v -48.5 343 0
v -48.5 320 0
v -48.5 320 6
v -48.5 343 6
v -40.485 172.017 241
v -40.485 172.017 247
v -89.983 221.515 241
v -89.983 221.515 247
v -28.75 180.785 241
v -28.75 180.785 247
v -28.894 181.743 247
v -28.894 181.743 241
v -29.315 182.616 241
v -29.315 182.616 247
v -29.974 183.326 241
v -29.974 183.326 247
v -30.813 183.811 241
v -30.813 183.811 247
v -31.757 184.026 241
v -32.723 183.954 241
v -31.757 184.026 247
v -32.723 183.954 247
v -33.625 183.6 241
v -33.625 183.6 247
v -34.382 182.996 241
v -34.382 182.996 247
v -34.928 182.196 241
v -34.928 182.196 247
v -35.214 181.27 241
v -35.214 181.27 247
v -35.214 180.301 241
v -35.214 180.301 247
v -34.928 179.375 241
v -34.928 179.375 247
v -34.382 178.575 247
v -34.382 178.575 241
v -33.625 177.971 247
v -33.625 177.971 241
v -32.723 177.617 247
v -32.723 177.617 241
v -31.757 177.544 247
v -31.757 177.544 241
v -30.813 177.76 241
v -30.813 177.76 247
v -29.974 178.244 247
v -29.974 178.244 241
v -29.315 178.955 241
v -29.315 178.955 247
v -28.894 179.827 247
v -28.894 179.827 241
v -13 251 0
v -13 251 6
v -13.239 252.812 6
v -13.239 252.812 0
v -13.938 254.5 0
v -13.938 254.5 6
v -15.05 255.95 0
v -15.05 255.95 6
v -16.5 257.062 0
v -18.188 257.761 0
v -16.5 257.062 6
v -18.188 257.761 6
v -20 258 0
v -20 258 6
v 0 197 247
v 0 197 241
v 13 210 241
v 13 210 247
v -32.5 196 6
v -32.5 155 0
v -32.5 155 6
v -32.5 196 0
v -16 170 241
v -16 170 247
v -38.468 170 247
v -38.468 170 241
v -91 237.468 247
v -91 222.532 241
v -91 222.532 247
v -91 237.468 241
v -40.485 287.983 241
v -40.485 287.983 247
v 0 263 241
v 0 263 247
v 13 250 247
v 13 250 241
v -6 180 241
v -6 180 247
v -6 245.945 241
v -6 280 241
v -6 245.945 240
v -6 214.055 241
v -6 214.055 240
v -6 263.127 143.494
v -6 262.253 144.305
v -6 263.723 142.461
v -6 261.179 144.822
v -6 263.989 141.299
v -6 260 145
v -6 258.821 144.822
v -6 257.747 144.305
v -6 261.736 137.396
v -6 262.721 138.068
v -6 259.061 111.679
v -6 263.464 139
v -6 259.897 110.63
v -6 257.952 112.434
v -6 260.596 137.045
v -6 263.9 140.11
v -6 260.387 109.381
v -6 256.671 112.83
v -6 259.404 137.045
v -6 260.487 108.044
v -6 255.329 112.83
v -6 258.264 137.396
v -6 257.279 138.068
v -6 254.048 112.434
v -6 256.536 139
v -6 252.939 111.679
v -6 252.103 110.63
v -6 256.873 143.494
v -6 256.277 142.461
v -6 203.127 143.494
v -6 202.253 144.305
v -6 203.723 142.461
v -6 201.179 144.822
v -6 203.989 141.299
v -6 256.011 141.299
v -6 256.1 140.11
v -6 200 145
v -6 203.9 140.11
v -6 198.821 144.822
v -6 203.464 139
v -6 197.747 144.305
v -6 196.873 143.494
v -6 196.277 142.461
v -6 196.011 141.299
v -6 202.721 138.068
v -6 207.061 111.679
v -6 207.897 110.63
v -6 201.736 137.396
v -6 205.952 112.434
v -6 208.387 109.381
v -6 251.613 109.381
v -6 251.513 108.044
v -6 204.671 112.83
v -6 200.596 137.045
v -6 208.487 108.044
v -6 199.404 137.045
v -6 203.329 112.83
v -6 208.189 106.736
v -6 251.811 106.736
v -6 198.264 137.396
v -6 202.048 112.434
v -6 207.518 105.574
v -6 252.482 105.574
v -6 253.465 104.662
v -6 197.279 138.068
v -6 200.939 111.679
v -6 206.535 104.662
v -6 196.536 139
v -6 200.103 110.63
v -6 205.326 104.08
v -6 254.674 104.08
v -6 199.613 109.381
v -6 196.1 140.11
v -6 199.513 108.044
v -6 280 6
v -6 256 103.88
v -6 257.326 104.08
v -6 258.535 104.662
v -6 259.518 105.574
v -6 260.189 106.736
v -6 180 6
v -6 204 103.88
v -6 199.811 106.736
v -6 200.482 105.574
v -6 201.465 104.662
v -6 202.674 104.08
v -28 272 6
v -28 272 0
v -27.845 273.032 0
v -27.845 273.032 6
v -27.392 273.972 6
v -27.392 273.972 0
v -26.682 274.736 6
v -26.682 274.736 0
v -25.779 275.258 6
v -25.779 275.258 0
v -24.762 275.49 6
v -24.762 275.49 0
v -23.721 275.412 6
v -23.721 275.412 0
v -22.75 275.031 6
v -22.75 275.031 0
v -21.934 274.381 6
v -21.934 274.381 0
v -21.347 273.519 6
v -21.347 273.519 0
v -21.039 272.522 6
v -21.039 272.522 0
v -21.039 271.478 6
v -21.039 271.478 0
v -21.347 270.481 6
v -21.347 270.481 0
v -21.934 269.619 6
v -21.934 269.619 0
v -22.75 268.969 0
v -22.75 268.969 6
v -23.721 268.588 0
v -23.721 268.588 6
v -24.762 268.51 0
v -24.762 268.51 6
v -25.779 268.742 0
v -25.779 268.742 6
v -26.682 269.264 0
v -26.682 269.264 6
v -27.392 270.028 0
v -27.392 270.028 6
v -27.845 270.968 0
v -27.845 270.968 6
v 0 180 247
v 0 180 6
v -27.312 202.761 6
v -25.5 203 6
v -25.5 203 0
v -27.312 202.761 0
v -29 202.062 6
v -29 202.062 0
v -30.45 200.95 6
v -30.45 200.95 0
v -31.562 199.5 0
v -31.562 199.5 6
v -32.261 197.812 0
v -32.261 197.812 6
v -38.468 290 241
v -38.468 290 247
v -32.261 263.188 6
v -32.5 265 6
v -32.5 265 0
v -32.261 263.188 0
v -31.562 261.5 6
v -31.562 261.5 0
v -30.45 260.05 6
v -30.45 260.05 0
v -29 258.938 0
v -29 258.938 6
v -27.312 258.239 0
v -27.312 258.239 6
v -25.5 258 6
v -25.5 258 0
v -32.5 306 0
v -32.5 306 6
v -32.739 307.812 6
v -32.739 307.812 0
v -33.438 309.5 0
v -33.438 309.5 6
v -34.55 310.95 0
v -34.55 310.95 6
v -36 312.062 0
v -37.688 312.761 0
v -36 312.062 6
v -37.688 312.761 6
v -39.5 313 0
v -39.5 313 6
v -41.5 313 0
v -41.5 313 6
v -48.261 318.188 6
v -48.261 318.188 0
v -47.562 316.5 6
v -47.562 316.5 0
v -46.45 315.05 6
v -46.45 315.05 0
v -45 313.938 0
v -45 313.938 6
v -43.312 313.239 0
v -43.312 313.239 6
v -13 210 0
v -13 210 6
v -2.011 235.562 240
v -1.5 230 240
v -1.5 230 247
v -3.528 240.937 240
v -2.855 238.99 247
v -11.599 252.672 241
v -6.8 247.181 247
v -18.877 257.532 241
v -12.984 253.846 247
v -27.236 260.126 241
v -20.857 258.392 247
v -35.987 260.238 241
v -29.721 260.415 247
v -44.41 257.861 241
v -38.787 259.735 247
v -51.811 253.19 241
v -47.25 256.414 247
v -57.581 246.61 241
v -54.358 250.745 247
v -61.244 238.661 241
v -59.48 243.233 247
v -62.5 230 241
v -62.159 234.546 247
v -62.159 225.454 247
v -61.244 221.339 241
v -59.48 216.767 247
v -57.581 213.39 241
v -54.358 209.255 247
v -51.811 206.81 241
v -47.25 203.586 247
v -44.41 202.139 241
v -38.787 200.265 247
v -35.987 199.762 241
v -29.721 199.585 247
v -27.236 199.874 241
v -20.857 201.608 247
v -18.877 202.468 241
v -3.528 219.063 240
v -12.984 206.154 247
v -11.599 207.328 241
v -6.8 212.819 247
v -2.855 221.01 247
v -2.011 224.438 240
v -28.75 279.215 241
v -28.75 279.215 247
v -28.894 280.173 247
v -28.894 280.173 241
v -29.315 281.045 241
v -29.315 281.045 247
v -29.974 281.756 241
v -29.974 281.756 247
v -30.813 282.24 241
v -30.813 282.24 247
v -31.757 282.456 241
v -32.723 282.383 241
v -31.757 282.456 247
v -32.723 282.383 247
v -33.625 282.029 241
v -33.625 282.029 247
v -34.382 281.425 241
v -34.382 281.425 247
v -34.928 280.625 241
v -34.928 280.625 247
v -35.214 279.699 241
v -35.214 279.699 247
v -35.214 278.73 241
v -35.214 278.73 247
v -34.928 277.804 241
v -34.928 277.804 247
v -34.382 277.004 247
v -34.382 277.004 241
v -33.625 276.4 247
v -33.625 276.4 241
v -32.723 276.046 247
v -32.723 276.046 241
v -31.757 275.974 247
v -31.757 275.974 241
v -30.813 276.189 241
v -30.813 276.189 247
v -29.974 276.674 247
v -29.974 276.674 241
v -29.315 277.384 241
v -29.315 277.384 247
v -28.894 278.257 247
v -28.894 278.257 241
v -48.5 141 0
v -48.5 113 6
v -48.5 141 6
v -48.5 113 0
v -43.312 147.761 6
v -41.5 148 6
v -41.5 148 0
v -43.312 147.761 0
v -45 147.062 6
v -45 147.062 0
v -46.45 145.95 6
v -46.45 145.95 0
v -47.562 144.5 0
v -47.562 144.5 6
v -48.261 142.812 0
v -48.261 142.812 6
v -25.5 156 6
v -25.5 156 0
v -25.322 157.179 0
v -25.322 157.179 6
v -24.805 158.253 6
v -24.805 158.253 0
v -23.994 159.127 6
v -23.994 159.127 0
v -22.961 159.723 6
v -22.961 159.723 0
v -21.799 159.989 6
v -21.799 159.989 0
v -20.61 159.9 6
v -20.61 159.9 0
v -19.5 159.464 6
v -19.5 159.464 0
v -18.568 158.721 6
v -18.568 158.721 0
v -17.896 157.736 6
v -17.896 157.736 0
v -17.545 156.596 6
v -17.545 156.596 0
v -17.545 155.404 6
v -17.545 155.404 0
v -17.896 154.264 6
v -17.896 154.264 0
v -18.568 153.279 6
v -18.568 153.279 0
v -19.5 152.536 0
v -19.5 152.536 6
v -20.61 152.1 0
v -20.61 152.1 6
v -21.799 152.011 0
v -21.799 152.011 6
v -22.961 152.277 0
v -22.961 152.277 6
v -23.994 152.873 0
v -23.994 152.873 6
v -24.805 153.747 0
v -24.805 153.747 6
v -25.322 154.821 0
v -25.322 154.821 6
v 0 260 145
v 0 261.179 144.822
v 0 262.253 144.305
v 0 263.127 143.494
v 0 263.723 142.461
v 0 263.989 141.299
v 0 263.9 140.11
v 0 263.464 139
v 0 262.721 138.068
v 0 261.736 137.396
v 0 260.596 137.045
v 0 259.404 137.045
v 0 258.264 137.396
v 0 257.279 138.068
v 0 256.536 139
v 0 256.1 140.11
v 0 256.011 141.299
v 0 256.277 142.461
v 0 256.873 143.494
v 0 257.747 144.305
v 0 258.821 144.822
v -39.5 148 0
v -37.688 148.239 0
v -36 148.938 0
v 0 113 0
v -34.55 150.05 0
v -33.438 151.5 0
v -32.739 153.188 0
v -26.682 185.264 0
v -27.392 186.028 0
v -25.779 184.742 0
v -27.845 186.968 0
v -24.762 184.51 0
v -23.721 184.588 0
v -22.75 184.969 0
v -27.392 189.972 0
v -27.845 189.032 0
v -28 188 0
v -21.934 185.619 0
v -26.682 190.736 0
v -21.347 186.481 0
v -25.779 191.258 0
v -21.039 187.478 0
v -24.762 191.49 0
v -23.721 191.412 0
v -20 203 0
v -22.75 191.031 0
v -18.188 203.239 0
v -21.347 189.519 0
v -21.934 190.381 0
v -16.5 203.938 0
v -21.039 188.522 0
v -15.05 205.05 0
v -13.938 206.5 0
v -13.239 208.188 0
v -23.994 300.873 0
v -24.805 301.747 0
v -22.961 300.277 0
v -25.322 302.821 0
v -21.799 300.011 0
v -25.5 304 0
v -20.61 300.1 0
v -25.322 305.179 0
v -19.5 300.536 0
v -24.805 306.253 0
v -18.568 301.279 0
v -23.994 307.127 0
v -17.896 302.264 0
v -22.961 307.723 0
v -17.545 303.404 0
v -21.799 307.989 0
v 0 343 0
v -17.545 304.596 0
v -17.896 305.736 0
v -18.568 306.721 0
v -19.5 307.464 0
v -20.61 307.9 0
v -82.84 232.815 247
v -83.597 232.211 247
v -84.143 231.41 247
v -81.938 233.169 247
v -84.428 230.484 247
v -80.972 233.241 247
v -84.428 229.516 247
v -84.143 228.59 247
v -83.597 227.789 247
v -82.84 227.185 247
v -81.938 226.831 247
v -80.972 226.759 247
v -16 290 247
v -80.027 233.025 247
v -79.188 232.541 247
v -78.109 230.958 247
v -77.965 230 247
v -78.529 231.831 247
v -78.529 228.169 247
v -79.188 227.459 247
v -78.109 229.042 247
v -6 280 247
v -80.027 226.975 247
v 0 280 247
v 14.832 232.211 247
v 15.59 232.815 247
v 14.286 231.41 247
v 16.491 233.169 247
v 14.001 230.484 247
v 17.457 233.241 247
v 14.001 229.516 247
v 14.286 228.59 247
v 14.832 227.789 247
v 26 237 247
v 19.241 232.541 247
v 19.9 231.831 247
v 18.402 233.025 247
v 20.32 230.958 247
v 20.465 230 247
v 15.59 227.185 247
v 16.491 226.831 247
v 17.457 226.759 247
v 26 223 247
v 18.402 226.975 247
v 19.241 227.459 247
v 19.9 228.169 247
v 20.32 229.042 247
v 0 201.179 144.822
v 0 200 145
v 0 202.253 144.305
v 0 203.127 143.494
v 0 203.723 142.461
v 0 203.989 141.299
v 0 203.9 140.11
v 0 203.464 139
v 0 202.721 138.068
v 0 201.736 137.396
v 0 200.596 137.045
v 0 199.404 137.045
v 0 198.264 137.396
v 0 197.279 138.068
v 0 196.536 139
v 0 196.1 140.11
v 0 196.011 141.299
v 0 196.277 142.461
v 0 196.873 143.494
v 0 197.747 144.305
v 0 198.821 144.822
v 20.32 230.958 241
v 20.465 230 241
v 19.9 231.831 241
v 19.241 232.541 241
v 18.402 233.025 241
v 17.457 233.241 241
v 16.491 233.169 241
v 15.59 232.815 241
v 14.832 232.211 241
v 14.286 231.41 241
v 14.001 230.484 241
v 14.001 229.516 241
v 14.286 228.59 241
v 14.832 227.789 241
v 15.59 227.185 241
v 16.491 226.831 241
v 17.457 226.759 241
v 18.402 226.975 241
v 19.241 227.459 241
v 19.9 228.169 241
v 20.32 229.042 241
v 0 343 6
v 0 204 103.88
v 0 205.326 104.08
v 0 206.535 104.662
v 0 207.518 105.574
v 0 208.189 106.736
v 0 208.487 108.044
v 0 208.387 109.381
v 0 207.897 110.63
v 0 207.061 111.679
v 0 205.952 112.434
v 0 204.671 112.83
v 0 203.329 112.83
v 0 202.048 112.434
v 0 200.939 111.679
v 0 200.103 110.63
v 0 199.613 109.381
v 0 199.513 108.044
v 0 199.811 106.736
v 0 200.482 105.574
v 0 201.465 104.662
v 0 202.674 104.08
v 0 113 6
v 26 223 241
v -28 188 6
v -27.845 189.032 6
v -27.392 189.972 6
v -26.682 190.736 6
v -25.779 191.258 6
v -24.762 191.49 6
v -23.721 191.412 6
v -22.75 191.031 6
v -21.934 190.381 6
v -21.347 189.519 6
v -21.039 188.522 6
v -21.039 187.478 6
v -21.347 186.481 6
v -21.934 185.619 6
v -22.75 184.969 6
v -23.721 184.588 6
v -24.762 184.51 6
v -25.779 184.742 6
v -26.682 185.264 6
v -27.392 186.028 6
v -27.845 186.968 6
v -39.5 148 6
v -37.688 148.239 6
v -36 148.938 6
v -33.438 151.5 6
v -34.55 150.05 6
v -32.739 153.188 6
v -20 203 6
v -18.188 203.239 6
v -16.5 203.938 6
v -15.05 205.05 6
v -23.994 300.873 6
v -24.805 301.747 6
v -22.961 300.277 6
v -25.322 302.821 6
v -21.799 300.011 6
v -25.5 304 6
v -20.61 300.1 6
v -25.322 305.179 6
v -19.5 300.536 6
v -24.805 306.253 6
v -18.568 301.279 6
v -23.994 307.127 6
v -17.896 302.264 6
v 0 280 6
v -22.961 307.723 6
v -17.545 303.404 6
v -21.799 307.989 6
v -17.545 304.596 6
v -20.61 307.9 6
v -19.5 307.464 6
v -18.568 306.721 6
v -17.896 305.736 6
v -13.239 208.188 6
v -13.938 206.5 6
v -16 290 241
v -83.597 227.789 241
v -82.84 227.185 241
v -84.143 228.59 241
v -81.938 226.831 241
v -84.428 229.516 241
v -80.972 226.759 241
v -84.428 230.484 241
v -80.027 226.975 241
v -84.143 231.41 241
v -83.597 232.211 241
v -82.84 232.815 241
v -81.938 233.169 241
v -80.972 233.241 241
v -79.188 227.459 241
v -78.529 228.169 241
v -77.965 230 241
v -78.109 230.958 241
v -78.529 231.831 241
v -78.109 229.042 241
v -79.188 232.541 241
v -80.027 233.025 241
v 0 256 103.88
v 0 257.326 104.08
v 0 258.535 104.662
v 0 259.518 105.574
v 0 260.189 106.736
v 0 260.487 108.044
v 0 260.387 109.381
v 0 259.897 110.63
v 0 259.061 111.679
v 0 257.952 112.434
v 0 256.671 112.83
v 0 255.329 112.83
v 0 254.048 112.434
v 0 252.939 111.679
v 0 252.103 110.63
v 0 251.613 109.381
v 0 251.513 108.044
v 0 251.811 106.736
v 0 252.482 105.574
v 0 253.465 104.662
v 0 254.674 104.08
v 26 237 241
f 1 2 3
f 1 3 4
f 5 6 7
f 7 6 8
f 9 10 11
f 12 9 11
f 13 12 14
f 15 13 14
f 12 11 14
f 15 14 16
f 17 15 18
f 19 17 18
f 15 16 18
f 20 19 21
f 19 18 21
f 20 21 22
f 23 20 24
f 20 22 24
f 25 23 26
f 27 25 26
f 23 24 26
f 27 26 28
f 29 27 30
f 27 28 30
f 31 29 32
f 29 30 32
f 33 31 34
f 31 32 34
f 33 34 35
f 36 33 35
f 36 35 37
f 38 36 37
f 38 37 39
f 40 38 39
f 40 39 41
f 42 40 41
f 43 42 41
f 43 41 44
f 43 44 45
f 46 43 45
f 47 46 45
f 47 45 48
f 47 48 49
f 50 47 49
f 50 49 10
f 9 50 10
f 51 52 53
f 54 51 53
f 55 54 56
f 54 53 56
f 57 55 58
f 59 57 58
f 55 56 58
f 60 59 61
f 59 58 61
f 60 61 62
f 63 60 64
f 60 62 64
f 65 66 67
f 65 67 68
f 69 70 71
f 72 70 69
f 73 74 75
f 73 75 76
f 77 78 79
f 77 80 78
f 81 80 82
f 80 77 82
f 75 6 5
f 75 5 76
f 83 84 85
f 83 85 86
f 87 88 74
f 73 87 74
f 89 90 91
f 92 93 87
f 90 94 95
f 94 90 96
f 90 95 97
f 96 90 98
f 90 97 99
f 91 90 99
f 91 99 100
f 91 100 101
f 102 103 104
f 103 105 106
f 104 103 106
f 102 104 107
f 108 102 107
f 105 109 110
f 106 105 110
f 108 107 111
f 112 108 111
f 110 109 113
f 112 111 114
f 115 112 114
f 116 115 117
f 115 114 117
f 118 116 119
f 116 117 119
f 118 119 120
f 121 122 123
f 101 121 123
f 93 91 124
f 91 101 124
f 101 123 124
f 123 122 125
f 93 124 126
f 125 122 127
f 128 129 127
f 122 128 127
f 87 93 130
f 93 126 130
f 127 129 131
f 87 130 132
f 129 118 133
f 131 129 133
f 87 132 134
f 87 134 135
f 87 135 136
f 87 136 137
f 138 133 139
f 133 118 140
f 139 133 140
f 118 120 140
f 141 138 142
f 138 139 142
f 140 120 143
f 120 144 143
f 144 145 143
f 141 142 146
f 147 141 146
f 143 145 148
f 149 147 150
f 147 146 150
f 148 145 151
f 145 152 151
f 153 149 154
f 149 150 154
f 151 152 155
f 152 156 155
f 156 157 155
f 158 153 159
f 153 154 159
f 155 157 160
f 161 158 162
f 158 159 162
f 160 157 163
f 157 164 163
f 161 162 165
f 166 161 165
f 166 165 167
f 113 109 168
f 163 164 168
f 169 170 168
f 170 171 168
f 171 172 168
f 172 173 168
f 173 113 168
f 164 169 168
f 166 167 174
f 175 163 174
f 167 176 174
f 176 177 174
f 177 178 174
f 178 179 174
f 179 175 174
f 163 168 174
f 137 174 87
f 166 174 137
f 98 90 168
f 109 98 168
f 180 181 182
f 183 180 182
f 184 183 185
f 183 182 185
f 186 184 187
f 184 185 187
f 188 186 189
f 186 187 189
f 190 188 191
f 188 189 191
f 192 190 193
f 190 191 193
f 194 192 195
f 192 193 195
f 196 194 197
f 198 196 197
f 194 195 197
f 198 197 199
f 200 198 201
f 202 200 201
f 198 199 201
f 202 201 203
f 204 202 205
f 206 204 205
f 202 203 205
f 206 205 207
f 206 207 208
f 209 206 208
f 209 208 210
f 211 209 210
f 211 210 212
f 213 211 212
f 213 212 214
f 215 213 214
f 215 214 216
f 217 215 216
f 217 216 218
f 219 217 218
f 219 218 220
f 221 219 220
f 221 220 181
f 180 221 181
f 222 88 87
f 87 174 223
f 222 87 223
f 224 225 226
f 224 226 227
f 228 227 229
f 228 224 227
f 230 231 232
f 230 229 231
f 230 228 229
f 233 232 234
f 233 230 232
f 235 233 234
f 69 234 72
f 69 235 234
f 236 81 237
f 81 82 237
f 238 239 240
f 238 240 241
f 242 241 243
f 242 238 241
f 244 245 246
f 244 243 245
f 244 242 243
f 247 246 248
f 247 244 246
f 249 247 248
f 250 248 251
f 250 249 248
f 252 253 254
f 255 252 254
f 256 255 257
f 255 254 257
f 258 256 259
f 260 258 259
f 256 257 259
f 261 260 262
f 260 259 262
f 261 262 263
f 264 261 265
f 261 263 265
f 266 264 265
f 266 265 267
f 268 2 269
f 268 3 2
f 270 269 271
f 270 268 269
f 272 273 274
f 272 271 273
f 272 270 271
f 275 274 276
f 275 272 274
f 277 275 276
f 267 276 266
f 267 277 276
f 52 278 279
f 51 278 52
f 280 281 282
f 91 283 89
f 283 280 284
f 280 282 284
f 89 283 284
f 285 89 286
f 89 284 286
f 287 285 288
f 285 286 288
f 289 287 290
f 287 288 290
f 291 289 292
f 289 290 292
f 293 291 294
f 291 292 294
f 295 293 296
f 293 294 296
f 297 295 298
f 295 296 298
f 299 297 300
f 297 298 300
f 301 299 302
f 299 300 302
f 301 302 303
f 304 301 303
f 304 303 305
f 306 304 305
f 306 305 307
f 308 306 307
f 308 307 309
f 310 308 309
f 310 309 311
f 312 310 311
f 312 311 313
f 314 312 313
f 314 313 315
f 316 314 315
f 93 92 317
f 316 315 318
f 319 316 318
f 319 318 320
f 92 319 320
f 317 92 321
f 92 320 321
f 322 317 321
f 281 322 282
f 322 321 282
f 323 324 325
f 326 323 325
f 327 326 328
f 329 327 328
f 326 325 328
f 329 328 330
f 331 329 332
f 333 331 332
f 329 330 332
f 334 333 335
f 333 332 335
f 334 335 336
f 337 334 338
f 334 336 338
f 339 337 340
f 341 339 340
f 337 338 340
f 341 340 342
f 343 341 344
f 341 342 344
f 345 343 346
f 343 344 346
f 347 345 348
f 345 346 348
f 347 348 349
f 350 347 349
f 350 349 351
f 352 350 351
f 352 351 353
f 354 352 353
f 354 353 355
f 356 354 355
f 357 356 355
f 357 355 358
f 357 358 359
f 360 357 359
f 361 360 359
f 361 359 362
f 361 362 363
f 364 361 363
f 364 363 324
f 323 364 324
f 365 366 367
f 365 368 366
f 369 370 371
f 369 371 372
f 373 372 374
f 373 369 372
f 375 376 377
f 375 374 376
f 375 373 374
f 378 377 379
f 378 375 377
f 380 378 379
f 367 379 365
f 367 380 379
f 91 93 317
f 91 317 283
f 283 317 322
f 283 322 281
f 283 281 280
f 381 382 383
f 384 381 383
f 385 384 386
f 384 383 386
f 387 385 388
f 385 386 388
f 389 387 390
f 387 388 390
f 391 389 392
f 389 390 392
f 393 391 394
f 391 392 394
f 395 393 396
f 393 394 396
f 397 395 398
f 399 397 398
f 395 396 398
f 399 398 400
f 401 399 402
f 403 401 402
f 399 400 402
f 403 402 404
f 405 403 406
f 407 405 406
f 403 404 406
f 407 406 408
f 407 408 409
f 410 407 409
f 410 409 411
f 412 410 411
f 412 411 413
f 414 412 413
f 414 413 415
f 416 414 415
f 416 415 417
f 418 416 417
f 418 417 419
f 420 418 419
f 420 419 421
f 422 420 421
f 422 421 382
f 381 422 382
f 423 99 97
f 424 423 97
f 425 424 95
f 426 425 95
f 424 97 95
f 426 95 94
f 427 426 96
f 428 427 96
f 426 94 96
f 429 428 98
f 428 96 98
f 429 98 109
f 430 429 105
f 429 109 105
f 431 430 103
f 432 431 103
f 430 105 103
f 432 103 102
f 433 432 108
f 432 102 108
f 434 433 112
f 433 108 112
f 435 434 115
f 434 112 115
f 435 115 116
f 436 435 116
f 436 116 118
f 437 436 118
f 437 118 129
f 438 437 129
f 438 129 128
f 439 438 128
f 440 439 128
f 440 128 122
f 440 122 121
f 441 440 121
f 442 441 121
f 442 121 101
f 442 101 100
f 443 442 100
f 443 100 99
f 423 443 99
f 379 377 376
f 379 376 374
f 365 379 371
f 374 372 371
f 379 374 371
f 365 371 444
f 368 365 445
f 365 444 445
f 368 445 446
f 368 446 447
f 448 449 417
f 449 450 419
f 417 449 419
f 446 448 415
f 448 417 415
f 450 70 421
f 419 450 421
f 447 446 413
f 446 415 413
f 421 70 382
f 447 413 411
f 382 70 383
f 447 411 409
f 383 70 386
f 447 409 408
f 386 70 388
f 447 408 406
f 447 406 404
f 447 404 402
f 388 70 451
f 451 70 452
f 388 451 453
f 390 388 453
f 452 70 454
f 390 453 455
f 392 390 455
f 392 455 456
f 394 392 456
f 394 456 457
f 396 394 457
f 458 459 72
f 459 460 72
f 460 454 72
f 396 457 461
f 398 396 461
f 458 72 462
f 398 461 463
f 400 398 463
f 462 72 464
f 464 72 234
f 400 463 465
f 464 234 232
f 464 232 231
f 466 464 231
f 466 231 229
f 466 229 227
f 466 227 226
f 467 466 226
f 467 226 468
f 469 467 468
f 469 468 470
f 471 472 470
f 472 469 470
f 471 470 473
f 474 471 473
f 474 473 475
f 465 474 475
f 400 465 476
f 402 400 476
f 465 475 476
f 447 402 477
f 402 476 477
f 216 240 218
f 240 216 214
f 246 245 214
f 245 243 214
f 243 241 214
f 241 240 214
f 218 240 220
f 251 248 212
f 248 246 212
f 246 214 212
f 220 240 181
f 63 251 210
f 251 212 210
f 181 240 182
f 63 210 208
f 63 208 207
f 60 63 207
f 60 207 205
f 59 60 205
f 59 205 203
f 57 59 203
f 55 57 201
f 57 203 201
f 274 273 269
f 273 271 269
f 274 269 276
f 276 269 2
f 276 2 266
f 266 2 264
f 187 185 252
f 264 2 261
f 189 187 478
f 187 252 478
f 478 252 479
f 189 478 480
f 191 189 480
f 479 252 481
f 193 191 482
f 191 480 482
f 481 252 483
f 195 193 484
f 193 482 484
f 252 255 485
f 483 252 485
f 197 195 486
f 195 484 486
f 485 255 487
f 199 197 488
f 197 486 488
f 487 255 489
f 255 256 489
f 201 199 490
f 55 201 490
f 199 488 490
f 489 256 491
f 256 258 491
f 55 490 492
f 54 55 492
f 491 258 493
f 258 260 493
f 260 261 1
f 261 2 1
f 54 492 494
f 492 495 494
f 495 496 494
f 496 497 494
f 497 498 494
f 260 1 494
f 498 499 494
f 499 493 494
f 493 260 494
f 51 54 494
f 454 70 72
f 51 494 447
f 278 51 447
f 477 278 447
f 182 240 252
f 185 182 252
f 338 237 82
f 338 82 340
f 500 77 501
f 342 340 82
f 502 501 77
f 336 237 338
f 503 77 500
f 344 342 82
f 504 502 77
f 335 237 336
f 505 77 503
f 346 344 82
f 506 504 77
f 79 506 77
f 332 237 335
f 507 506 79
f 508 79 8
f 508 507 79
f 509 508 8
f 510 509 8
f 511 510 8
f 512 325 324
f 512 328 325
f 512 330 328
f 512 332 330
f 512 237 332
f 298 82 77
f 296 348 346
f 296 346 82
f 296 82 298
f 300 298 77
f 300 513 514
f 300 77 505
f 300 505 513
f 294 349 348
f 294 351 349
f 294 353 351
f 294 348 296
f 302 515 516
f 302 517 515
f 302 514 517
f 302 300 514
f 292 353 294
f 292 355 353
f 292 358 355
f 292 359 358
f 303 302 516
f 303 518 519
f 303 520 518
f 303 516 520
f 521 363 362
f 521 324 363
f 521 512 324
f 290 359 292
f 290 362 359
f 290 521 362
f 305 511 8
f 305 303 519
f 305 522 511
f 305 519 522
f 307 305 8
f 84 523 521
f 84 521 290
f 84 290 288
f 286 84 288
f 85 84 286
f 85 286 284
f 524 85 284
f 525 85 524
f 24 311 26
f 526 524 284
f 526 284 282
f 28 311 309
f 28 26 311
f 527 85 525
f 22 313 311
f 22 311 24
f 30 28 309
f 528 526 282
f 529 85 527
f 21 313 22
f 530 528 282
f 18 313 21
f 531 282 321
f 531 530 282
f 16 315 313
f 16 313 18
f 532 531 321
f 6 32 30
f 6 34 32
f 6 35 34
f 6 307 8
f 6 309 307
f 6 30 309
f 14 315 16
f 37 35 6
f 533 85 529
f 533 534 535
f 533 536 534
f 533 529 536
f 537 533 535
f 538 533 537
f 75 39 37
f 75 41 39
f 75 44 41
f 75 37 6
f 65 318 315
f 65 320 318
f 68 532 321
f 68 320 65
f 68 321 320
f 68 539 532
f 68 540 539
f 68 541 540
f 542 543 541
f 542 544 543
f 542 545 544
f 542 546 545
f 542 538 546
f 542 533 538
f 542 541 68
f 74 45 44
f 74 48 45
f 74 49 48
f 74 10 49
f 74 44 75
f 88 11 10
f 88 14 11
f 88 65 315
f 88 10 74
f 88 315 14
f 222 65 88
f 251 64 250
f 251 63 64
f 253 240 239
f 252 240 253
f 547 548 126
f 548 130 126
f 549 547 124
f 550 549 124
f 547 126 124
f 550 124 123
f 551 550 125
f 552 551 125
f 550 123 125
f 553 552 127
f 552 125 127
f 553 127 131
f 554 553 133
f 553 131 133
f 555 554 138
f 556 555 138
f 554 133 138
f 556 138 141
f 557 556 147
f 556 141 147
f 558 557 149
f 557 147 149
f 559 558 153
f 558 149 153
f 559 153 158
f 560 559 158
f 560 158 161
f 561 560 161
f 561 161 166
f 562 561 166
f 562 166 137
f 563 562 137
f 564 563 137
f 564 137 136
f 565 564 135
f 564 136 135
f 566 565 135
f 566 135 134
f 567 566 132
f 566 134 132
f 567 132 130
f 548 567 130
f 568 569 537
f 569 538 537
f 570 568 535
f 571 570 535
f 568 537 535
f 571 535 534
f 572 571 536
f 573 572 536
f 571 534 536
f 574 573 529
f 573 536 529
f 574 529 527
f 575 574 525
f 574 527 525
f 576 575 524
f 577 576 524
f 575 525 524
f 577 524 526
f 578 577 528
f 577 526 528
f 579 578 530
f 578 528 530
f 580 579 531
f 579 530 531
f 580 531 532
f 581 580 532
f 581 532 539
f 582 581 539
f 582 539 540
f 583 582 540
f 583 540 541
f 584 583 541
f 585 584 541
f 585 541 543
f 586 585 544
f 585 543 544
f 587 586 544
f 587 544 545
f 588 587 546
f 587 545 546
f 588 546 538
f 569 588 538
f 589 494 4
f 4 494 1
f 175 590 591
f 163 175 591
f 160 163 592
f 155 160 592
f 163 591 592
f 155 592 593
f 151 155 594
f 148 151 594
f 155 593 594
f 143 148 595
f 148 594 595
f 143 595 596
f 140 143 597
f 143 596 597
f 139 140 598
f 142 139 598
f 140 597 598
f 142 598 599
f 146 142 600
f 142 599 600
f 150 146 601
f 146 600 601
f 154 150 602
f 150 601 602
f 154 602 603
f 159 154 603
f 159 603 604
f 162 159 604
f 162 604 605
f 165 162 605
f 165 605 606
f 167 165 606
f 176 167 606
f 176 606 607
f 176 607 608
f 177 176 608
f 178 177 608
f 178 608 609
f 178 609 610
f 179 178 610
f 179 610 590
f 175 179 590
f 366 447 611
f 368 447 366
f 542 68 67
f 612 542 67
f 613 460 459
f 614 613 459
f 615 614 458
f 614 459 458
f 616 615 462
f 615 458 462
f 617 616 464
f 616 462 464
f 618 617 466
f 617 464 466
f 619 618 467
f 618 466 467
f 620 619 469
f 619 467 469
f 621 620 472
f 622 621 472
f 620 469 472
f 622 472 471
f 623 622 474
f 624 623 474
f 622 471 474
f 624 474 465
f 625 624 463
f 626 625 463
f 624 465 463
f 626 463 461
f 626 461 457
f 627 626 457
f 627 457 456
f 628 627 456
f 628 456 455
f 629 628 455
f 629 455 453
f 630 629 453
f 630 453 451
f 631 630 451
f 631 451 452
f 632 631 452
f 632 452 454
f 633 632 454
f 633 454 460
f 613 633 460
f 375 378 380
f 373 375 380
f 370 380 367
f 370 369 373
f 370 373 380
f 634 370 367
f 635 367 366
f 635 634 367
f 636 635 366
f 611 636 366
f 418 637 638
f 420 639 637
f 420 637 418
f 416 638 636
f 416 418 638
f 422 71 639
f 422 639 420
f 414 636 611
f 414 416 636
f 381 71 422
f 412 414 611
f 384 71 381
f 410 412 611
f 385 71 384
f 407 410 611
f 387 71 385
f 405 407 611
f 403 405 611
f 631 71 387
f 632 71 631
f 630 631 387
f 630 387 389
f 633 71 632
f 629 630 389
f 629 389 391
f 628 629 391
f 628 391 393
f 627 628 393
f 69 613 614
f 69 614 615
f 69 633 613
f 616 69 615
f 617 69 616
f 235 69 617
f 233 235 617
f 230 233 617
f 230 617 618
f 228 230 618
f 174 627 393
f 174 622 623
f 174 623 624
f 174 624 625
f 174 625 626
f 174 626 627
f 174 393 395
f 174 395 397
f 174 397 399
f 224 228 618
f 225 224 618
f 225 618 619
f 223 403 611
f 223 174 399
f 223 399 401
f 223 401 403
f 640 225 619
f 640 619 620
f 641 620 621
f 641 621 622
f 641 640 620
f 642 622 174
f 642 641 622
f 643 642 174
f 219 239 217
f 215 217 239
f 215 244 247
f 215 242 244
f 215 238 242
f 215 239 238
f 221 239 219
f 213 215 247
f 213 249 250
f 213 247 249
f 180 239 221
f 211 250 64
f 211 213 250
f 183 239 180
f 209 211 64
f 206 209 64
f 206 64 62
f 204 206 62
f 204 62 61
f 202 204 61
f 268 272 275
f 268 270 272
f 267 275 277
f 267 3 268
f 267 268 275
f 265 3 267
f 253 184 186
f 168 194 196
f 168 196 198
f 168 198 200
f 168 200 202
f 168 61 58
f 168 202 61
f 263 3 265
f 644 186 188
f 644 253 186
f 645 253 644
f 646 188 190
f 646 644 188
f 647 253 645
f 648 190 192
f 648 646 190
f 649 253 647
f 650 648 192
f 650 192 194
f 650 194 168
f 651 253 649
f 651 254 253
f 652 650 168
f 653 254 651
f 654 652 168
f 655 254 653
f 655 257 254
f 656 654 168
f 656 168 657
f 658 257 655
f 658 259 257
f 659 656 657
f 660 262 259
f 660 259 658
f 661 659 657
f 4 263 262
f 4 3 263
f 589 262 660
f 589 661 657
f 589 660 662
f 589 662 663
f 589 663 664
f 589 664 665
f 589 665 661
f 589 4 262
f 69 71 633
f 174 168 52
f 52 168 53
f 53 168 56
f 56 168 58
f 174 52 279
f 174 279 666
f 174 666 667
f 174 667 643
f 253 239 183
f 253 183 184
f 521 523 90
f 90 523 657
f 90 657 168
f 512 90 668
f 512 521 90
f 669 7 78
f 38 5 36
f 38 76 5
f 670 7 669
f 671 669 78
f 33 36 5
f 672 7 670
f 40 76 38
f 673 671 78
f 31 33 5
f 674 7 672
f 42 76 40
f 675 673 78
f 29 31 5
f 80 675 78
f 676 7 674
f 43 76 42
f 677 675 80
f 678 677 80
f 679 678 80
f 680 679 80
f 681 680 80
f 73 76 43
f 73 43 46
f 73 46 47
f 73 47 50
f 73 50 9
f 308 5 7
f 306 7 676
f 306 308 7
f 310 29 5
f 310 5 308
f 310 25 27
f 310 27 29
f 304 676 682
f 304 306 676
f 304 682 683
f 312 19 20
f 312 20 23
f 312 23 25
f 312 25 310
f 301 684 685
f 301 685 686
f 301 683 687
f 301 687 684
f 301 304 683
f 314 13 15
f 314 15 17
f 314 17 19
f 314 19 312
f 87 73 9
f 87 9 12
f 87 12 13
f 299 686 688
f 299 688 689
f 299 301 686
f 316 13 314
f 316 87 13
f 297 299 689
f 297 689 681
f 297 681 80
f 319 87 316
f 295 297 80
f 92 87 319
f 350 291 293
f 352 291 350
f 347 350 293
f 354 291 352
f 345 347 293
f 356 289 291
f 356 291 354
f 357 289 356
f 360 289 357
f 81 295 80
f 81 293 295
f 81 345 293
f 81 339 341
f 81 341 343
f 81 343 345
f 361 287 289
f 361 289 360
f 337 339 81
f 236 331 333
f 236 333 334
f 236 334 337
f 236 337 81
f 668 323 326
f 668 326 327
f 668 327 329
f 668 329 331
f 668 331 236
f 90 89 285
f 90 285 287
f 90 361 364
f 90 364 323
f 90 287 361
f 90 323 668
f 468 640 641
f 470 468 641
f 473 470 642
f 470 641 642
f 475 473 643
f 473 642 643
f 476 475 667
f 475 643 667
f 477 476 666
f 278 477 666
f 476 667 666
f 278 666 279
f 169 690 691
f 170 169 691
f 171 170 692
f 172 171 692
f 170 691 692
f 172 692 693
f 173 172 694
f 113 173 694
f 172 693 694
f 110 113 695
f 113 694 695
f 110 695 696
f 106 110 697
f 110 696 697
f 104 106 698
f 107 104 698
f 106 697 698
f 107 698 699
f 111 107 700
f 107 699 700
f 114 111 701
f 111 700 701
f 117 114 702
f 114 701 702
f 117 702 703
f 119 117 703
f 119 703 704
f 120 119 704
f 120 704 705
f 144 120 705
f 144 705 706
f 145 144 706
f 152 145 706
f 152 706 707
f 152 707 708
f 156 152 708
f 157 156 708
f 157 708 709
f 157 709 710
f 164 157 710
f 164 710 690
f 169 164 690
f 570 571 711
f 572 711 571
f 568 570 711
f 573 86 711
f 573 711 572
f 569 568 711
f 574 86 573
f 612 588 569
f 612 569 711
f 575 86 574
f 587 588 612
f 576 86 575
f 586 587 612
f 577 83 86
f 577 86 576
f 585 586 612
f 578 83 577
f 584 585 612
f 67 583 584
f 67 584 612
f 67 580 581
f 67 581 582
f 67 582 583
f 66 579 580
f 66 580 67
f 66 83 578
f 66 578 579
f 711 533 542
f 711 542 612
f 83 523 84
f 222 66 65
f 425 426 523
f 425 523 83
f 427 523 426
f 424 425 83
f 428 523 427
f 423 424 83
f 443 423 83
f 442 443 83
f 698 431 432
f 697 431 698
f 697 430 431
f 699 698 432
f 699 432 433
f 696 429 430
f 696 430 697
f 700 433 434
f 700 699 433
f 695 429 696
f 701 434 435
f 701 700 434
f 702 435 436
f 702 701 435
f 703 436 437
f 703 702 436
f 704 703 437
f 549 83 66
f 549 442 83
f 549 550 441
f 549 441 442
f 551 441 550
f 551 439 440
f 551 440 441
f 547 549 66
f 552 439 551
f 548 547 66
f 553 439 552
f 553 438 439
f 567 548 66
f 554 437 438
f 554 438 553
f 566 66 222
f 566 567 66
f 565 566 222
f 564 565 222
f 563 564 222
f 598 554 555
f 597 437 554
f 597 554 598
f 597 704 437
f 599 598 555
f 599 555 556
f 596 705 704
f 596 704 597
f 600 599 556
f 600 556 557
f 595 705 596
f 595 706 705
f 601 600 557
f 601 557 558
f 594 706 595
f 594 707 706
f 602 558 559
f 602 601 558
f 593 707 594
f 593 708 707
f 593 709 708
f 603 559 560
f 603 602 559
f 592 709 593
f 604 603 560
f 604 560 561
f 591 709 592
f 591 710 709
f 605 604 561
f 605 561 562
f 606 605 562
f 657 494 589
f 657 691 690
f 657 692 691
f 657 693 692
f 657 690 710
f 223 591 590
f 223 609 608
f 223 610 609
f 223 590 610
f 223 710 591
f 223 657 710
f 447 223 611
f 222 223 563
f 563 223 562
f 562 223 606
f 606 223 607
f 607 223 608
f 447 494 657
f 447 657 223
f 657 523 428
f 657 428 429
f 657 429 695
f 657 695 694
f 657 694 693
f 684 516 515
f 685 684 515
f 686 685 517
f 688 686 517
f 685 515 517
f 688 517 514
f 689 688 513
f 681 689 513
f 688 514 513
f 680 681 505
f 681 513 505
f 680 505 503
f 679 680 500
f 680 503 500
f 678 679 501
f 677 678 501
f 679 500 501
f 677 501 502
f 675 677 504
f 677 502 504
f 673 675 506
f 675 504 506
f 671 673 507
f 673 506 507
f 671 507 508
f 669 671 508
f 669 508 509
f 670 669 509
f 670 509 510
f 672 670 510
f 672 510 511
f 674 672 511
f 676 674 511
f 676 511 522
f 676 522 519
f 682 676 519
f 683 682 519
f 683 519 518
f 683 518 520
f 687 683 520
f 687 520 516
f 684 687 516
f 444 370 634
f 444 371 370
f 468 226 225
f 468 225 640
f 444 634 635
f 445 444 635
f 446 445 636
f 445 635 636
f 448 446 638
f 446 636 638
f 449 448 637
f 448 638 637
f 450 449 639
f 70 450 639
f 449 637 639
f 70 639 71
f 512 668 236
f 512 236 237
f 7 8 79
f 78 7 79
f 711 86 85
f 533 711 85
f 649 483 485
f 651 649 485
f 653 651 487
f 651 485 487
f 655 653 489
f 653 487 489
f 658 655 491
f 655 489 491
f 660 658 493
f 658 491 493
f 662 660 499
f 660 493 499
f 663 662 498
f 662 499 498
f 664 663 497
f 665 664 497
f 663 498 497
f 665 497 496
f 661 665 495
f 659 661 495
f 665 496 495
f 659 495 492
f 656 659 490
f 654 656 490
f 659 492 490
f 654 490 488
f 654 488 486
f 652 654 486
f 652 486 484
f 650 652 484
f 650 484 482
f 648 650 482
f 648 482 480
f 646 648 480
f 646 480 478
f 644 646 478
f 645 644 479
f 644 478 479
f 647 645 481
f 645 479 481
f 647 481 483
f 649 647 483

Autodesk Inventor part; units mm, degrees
ref_plane "YZ Plane" through (0, 0, 0) normal (1, 0, 0) x (0, 1, 0)
sketch "Sketch1" plane through (0, 0, 0) normal (0, 0, 1) x (1, 0, 0)
  line L0 (0, 343) -> (-48.5, 343) projected
  line L1 (0, 343) -> (0, 113)
  line L2 (0, 113) -> (-48.5, 113)
  line L3 (-48.5, 113) -> (-48.5, 148)
  line L4 (-48.5, 148) -> (-32.5, 148)
  line L5 (-32.5, 148) -> (-32.5, 203)
  line L6 (-32.5, 203) -> (-13, 203)
  line L7 (-13, 203) -> (-13, 258)
  line L8 (-13, 258) -> (-32.5, 258)
  line L9 (-32.5, 258) -> (-32.5, 313)
  line L10 (-32.5, 313) -> (-48.5, 313)
  line L11 (-48.5, 313) -> (-48.5, 343)
  point P0 (0, 0)
  dimension "d0" = 230
  dimension "d1" = 13
  dimension "d2" = 30
  dimension "d3" = 55
  dimension "d4" = 55
  dimension "d5" = 55
  dimension "d6" = 16
extrude "Extrusion1" add sketch "Sketch1" along normal blind 6
fillet "Fillet1" radius 7 8 edges at (-32.5, 148, 3) (-32.5, 203, 3) (-13, 203, 3) (-13, 258, 3) (-32.5, 258, 3) (-32.5, 313, 3) (-48.5, 313, 3) (-48.5, 148, 3)
sketch "Sketch2" plane through (0, 0, 6) normal (0, 0, 1) x (1, 0, 0)
  line L0 (0, 113) -> (0, 343) projected
  line L1 (-6, 180) -> (0, 180)
  line L2 (0, 180) -> (0, 280)
  line L3 (0, 280) -> (-6, 280)
  line L4 (-6, 280) -> (-6, 180)
  line L5 (-15.5, 205) -> (-48.5, 205) construction
  line L6 (-48.5, 255) -> (-15.5, 255) construction
  line L7 (-15.5, 255) -> (-15.5, 205) construction
  line L8 (-15.5, 230) -> (0, 230) construction
  point P0 (0, 0)
  dimension "d10" = 100
  dimension "d11" = 6
extrude "Extrusion2" add sketch "Sketch2" along normal blind 241
sketch "Sketch3" plane through (-6, 180, 6) normal (-1, 0, 0) x (0, 0, 1)
  line L0 (241, 0) -> (241, 100) projected
  line L1 (235, 0) -> (235, 100)
  line L2 (241, 100) -> (241, 0)
  line L3 (241, 100) -> (241, 0) projected
  line L4 (241, 0) -> (241, -10)
  line L5 (241, -10) -> (235, -10)
  line L6 (235, -10) -> (235, 0)
  line L7 (235, 100) -> (235, 110)
  line L8 (235, 110) -> (241, 110)
  line L9 (0, 100) -> (241, 100) construction
  line L10 (241, 110) -> (241, 100)
  point P0 (-6, -180)
  dimension "d14" = 6
  dimension "d17" = 10
  dimension "d18" = 10
extrude "Extrusion3" add sketch "Sketch3" along normal blind 85
sketch "Sketch4" plane through (0, 0, 247) normal (0, 0, 1) x (1, 0, 0)
  line L0 (-37.6569, 174.8457) -> (-87.1543, 224.3431) construction
  line L1 (-87.1543, 235.6569) -> (-37.6569, 285.1543) construction
  line L2 (-40.4853, 172.0172) -> (-89.9828, 221.5147)
  line L3 (-91, 237.468) -> (-40.4853, 287.9828)
  line L4 (-89.9828, 221.5147) -> (-91, 222.532)
  line L5 (-91, 170) -> (-91, 290) projected
  line L6 (-89.9828, 238.4853) -> (-91, 237.468)
  line L7 (-40.4853, 287.9828) -> (-38.468, 290)
  line L8 (-6, 290) -> (-91, 290) projected
  line L9 (-40.4853, 172.0172) -> (-38.468, 170)
  line L10 (-6, 170) -> (-91, 170) projected
  line L11 (-38.468, 170) -> (-91, 170)
  line L12 (-6, 170) -> (-91, 170) projected
  line L13 (-91, 170) -> (-91, 222.532)
  line L14 (-91, 237.468) -> (-91, 290)
  line L15 (23.1543, 224.3431) -> (-26.3431, 174.8457) construction
  line L16 (-26.3431, 285.1543) -> (23.1543, 235.6569) construction
  line L17 (-18.7487, 292.7487) -> (30.7487, 243.2513) construction
  line L18 (30.7487, 216.7487) -> (-18.7487, 167.2513) construction
  line L19 (-6, 180) -> (0, 180) projected
  line L20 (-6, 170) -> (-6, 180) projected
  line L21 (-6, 180) -> (-6, 170)
  line L22 (-6, 170) -> (-16, 170)
  line L23 (-6, 180) -> (-16, 170)
  line L24 (-6, 280) -> (-6, 290) projected
  line L25 (-6, 280) -> (-6, 290)
  line L26 (-6, 290) -> (-16, 290)
  line L27 (-6, 280) -> (-16, 290)
  line L28 (-38.468, 290) -> (-91, 290)
  point P0 (0, 0)
  dimension "d19" = 4
  dimension "d20" = 4
extrude "Extrusion4" cut sketch "Sketch4" against normal blind 7
sketch "Sketch5" plane through (0, 113, 0) normal (1, 0, 0) x (0, 0, -1)
  line L0 (-241, 97) -> (-247, 97)
  line L1 (-247, 97) -> (-247, 137)
  line L2 (-247, 137) -> (-241, 137)
  line L3 (-241, 137) -> (-241, 97)
  line L4 (-247, 67) -> (-247, 167) projected
  point P0 (0, -113)
  point P1 (-247, 117)
  dimension "d25" = 6
  dimension "d26" = 40
extrude "Extrusion5" add sketch "Sketch5" along normal blind 26
chamfer "Chamfer1" distance 13 angle 45 4 edges at (0, 210, 244) (26, 210, 244) (26, 250, 244) (0, 250, 244)
sketch "Sketch6" plane through (0, 0, 247) normal (0, 0, 1) x (1, 0, 0)
  circle A0 centre (-32, 180.7854) radius 3.25 projected
  circle A1 centre (-81.2146, 230) radius 3.25 projected
  circle A2 centre (-32, 279.2146) radius 3.25 projected
  circle A3 centre (17.2146, 230) radius 3.25 projected
  circle A4 centre (-32, 230) radius 30 construction
  circle A5 centre (-32, 230) radius 30.5
  point P0 (0, 0)
  dimension "d33" = 0.5
extrude "Extrusion6" cut sketch "Sketch6" against normal blind 7
ref_plane "Work Plane1" through (-6, 230, 6) normal (0, -1, 0) x (1, 0, 0)
ref_plane "Work Plane2" through (-6, 190, 6) normal (0, -1, 0) x (1, 0, 0)
sketch "Sketch8" plane through (-6, 230, 6) normal (0, -1, 0) x (1, 0, 0)
  point P0 (6, -6)
sketch "Sketch11" plane through (-6, 230, 6) normal (0, -1, 0) x (1, 0, 0)
  point P0 (6, -6)
sketch "Sketch13" plane through (0, 0, 0) normal (0, 0, -1) x (-1, 0, 0)
  line L0 (0, 233) -> (0, 227) projected
  line L1 (0, 230) -> (0, 188)
  line L2 (0, 188) -> (24.5, 188)
  circle A0 centre (24.5, 188) radius 3.5
  line L3 (0, 230) -> (0, 156)
  line L4 (0, 113) -> (0, 180) projected
  line L5 (0, 156) -> (21.5, 156)
  circle A1 centre (21.5, 156) radius 4
  line L6 (0, 230) -> (0, 272)
  line L7 (0, 113) -> (0, 343) projected
  line L8 (0, 230) -> (0, 304)
  line L9 (0, 304) -> (21.5, 304)
  line L10 (0, 272) -> (24.5, 272)
  circle A2 centre (24.5, 272) radius 3.5
  circle A3 centre (21.5, 304) radius 4
  point P0 (0, 0)
  dimension "d56" = 42
  dimension "d57" = 24.5
  dimension "d58" = 7
  dimension "d59" = 74
  dimension "d60" = 21.5
  dimension "d61" = 8
  dimension "d62" = 42
  dimension "d63" = 74
  dimension "d64" = 7
  dimension "d65" = 8
sketch "Sketch15" plane through (-6, 280, 6) normal (-1, 0, 0) x (0, 0, 1)
  point P0 (-6, -280)
extrude "Extrusion19" cut sketch "Sketch13" against normal blind 16
sketch "Sketch23" plane through (0, 113, 0) normal (1, 0, 0) x (0, 0, -1)
  circle A0 centre (-108.38, 91) radius 4.5
  line L0 (-6, 67) -> (-247, 67) projected
  line L1 (-6, 0) -> (-6, 230) projected
  line L2 (0, 0) -> (0, 230) construction
  circle A1 centre (-108.38, 143) radius 4.5
  line L3 (-6, 167) -> (-6, 230) projected
  line L4 (-6, 167) -> (-247, 167) projected
  point P0 (0, -113)
  point P1 (-61, 67)
  point P2 (-6, 55)
  point P3 (-6, 179)
  point P4 (-61, 167)
  dimension "d87" = 9
  dimension "d88" = 24
  dimension "d89" = 102.38
  dimension "d90" = 9
  dimension "d91" = 102.38
  dimension "d92" = 24
extrude "Extrusion20" cut sketch "Sketch23" against normal through all
sketch "Sketch24" plane through (-6, 180, 6) normal (-1, 0, 0) x (0, 0, 1)
  circle A0 centre (135, 80) radius 4
  circle A1 centre (135, 20) radius 4
  line L0 (0, 0) -> (235, 0) projected
  line L1 (0, 100) -> (235, 100) projected
  line L2 (0, 71) -> (0, 30) projected
  point P0 (-6, -180)
  dimension "d95" = 8
  dimension "d96" = 8
  dimension "d97" = 20
  dimension "d98" = 20
  dimension "d99" = 135
extrude "Extrusion21" cut sketch "Sketch24" against normal blind 10
equation "\"d98\" = d97"
properties part number "X axis screw support" material "Steel"
